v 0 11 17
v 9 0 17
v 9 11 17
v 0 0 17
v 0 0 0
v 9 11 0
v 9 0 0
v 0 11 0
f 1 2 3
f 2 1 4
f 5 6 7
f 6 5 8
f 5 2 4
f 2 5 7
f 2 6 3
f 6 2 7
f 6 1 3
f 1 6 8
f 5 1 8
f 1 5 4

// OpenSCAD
// Generated by SolidPython 1.0.1 on 2020-07-29 00:39:26


cube(size = [9, 11, 17]);
/***********************************************
*********      SolidPython code:      **********
************************************************
 
# import packages: SolidPython
from solid import *
from solid.utils import *
from itertools import chain, combinations


class Resize:

    def __init__(self, scad_file):
        self.scad_file = scad_file
        #self.scad_file = import_scad(scad_file)
        # cone/cylinder param:
        self.r1 = 0
        self.r2 = 0
        self.h = 0
        # rectangular prism param:
        self.w = 0
        self.l = 0
        # ellipse param:
        self.r = 0

    # import OpenScad code (file name corresponds to shape)


    # classify shape + parameters
    def assign(self, param1, param2, param3):
        if self.scad_file == 'cone.scad':
            self.r1 = param1
            self.r2 = param2
            self.h = param3
        elif self.scad_file == 'cylinder.scad':
            self.r1 = param1
            self.r2 = param2
            self.h = param3
        elif self.scad_file == 'rectangularPrism.scad':
            self.h = param1
            self.l = param2
            self.w = param3
        else:
            self.r = param1
            self.h = param2

    # resize parameters
    def iterate(self):
        x = range(3, 20, 2)
        i = 1
        if self.scad_file == 'cone.scad':
            tempList = list(combinations(x, 2))
            for temp in tempList:
                param1 = temp[0]
                param2 = temp[1]
                filepath = 'produced_scad_files/' + 'cone' + str(param1) + '_' + str(param2) + '_' + '.scad'
                scad_render_to_file(cylinder(h=param1, r1=param2, r2=0), filepath)

        elif self.scad_file == 'cylinder.scad':
            tempList = list(combinations(x, 3))
            for temp in tempList:
                param1 = temp[0]
                param2 = temp[1]
                filepath = 'produced_scad_files/' + 'cylinder' + str(param1) + '_' + str(param2) + '_' + '.scad'
                scad_render_to_file(cylinder(h=param1, r1=param2, r2=param2), filepath)

        elif self.scad_file == 'rectangularPrism.scad':
            tempList = list(combinations(x, 3))
            for temp in tempList:
                param1 = temp[0]
                param2 = temp[1]
                param3 = temp[2]
                filepath = 'produced_scad_files/' + 'rectangularPrism' + str(param1) + '_' + str(param2) + '_' + str(
                    param3) + '.scad'
                scad_render_to_file(cube(size=(param1, param2, param3)), filepath)

        elif self.scad_file == 'ellipse.scad':
            tempList = list(combinations(x, 4))
            for temp in tempList:
                param1 = temp[0]
                param2 = temp[1]
                param3 = temp[2]
                param4 = temp[3]
                filepath = 'produced_scad_files/' + 'ellipse' + str(param1) + '_' + str(param2) + '_' + str(param3) + '_' + str(param4) + '.scad'
                scad_render_to_file(scale([param1, param2, param3])(sphere(r=param4)), filepath)

    def render_to_scadfile(self):
        scad_render_to_file(scad, 'example.scad') 
 
************************************************/
